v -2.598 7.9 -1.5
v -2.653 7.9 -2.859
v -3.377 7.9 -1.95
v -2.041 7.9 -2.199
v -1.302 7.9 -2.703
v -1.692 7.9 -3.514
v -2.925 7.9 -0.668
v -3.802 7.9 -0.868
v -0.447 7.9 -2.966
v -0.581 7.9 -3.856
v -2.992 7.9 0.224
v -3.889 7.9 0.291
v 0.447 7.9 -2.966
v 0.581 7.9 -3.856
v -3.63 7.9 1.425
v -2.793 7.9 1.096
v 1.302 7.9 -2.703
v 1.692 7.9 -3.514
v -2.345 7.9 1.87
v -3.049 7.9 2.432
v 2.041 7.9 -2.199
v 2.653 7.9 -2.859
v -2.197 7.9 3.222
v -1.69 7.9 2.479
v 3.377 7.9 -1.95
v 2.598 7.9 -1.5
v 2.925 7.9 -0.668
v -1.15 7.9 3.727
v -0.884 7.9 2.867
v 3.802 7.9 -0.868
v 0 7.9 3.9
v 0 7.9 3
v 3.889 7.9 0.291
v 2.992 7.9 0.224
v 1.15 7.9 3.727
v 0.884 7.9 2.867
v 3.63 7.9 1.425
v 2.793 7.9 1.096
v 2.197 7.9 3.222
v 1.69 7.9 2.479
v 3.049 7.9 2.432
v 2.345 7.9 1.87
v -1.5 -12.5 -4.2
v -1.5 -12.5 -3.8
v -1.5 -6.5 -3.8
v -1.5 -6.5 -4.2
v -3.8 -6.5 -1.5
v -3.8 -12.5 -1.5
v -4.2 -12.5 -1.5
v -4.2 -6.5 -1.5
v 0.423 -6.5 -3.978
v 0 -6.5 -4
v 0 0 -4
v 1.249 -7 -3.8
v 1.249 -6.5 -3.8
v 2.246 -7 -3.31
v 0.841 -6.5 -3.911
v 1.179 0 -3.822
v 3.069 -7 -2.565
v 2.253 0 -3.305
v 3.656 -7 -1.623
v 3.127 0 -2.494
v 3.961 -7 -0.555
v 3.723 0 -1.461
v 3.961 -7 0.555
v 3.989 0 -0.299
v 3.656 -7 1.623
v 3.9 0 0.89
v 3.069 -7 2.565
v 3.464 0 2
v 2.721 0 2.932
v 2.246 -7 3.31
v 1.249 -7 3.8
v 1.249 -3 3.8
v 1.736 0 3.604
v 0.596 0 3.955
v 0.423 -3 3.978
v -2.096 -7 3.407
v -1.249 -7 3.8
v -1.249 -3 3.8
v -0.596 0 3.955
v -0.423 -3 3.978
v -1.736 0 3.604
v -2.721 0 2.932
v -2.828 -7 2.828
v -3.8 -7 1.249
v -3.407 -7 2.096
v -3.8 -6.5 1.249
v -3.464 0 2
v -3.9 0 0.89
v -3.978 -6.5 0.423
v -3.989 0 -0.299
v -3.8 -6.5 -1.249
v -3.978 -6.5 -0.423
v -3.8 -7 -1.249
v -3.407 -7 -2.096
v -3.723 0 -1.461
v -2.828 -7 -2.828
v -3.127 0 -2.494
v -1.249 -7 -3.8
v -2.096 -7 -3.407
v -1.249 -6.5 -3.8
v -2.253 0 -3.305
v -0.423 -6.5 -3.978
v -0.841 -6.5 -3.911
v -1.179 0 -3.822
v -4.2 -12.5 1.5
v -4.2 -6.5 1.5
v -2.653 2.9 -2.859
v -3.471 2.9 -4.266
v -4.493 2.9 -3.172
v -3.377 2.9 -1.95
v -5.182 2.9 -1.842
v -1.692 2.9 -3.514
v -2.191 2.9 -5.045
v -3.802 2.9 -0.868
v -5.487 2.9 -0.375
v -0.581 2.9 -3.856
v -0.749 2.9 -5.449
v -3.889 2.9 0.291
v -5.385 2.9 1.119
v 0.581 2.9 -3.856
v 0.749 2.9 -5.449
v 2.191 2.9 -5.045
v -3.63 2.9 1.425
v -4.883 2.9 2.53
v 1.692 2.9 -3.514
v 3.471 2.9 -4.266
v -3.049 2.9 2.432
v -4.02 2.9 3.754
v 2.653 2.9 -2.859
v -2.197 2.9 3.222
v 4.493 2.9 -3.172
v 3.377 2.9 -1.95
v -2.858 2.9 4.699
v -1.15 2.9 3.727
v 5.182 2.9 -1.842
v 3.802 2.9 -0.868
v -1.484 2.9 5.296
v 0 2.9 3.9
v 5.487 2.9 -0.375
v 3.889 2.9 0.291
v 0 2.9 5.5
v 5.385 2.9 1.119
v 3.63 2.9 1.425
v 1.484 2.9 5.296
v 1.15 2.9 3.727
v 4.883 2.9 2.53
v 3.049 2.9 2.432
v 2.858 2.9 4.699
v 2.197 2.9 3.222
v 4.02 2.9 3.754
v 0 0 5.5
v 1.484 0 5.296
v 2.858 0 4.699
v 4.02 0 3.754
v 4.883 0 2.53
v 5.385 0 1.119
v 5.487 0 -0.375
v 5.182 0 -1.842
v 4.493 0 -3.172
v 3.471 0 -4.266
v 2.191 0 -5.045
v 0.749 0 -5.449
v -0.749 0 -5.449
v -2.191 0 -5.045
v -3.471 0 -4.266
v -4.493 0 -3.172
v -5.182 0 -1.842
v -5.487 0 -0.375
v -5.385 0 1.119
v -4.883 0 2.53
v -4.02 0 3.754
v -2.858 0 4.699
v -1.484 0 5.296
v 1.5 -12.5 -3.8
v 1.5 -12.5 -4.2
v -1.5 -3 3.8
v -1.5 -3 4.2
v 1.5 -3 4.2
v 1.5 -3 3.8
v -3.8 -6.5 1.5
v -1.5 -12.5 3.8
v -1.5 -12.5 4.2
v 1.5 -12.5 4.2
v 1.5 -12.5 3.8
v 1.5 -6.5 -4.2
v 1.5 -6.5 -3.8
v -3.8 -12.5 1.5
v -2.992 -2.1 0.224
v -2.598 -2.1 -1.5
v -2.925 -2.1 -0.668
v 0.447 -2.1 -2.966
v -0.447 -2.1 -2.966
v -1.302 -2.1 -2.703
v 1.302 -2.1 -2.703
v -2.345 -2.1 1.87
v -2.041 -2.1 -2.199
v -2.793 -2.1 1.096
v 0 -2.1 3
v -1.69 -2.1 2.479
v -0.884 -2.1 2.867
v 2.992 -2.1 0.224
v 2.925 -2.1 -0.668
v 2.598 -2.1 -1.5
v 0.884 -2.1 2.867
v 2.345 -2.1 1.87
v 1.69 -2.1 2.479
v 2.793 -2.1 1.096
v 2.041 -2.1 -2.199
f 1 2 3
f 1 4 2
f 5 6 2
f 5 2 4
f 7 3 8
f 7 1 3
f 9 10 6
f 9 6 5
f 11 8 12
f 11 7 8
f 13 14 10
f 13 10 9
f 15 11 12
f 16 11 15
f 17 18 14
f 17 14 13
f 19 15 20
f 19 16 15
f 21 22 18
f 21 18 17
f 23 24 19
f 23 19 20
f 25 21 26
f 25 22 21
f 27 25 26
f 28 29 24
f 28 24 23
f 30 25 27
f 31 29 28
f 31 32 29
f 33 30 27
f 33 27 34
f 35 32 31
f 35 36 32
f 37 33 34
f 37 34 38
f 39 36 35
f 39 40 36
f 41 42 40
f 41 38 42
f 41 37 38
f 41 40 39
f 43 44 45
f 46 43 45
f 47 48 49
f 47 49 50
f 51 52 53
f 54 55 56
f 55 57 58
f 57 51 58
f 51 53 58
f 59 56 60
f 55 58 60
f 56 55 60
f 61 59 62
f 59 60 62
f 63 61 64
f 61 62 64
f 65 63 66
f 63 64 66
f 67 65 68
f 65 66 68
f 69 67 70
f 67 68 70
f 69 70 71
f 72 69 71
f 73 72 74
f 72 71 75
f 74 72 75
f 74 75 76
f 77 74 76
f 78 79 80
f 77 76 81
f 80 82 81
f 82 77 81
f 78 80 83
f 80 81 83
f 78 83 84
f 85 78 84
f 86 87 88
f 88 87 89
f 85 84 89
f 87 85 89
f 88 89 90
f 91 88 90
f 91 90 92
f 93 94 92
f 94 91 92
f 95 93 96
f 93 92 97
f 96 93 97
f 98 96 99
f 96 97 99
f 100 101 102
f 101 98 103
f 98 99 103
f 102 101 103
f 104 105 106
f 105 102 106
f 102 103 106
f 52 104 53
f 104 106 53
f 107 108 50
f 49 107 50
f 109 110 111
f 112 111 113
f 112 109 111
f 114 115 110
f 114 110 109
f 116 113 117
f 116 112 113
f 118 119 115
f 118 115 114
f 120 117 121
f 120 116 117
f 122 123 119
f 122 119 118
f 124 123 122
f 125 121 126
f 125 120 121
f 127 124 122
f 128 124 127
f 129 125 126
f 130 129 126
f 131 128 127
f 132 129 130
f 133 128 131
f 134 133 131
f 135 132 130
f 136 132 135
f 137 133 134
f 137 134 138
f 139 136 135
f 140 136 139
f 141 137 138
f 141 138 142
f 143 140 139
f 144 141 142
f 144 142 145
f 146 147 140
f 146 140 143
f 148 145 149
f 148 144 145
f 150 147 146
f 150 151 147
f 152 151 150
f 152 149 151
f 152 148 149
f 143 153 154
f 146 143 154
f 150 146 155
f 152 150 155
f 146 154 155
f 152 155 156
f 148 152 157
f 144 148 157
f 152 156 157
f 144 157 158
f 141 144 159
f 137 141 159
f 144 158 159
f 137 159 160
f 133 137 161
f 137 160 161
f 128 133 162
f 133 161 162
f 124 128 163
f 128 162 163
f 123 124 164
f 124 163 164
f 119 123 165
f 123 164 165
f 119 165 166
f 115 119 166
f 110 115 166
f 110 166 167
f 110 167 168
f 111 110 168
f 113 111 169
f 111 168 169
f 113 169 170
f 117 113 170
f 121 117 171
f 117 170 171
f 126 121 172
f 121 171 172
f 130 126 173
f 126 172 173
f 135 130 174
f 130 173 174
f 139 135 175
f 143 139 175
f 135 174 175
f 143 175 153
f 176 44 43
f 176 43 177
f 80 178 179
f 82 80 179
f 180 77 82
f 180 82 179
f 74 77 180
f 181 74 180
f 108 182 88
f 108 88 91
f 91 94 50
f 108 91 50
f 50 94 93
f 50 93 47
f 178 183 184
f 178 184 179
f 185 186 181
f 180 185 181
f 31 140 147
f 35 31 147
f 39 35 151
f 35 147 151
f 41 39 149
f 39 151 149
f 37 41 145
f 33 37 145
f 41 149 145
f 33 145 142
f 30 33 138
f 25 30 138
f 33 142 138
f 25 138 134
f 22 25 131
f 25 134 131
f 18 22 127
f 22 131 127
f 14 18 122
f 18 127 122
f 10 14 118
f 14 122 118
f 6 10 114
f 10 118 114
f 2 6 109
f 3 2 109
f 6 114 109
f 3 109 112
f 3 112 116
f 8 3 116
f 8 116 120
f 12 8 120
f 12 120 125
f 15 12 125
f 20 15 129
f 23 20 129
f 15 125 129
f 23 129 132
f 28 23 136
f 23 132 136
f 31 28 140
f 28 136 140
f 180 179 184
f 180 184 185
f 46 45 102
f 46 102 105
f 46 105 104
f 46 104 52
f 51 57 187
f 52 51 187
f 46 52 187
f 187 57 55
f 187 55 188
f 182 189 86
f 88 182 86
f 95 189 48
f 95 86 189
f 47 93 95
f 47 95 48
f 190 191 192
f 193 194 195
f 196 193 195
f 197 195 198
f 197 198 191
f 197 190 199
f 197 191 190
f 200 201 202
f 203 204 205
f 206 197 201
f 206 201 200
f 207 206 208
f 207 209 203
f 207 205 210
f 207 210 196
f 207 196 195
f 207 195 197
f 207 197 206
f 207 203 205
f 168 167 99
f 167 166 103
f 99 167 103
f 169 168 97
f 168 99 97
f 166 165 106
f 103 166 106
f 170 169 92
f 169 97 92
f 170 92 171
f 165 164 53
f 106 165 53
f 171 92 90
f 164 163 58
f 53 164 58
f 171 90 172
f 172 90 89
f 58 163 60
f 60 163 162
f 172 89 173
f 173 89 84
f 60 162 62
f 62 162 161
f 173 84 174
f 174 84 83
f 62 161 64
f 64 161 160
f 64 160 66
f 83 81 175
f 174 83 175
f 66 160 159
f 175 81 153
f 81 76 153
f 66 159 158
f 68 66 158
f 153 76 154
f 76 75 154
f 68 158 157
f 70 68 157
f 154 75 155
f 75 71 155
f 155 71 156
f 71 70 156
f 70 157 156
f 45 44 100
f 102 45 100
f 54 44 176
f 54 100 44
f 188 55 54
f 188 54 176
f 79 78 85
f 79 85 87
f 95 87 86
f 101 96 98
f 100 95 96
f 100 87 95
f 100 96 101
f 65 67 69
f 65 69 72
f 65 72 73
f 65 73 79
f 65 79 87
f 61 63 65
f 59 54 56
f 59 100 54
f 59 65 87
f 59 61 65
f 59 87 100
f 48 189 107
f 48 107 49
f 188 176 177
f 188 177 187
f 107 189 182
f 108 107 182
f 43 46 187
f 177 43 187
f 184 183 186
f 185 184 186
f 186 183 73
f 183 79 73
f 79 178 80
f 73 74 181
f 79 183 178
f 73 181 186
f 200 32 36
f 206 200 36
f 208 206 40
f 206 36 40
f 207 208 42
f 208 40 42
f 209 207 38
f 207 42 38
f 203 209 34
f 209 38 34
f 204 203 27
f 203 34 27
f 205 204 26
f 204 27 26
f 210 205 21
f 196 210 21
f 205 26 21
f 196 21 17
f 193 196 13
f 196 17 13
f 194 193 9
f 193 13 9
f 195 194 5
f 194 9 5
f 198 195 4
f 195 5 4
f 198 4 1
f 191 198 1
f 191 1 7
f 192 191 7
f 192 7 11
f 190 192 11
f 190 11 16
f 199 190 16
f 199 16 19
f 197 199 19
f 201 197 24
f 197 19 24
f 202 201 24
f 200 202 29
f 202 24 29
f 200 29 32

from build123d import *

# Parameters (mm, degrees)
SCHIZZO1_R                   = 5.5
ESTRUSIONE_ESTRUSIONE1_DEPTH = 2.9
SCHIZZO2_R                   = 3.9
ESTRUSIONE_ESTRUSIONE2_DEPTH = 5
SCHIZZO3_R                   = 4
ESTRUSIONE_ESTRUSIONE3_DEPTH = 7
SCHIZZO4_R                   = 3
TAGLIO_ESTRUSIONE1_DEPTH     = 10
SCHIZZO5_W                   = 3
SCHIZZO5_H                   = 9.5
ESTRUSIONE_ESTRUSIONE4_DEPTH = 0.4
SCHIZZO7_W                   = 3
SCHIZZO7_H                   = 6
ESTRUSIONE_ESTRUSIONE5_DEPTH = 0.4
SCHIZZO8_W                   = 3
SCHIZZO8_H                   = 6
ESTRUSIONE_ESTRUSIONE6_DEPTH = 0.4


with BuildPart() as part:
    # Schizzo1 → Estrusione-Estrusione1 (new body)
    with BuildSketch(Plane(origin=(0, 0, 0), x_dir=(1, 0, 0), z_dir=(0, 1, 0))):
        with Locations(Location((0, 0, 0), (0, 0, 270))):
            Circle(SCHIZZO1_R)
    extrude(amount=ESTRUSIONE_ESTRUSIONE1_DEPTH)

    # Schizzo2 → Estrusione-Estrusione2 (add)
    with BuildSketch(Plane(origin=(0, 2.9, 0), x_dir=(1, 0, 0), z_dir=(0, 1, 0))):
        with Locations(Location((0, 0, 0), (0, 0, 270))):
            Circle(SCHIZZO2_R)
    extrude(amount=ESTRUSIONE_ESTRUSIONE2_DEPTH)

    # Schizzo3 → Estrusione-Estrusione3 (add)
    with BuildSketch(Plane.XZ):
        with Locations(Location((0, 0, 0), (0, 0, 270))):
            Circle(SCHIZZO3_R)
    extrude(amount=ESTRUSIONE_ESTRUSIONE3_DEPTH)

    # Schizzo4 → Taglio-Estrusione1 (cut)
    with BuildSketch(Plane(origin=(0, 7.9, 0), x_dir=(1, 0, 0), z_dir=(0, 1, 0))):
        with Locations(Location((0, 0, 0), (0, 0, 270))):
            Circle(SCHIZZO4_R)
    extrude(amount=-TAGLIO_ESTRUSIONE1_DEPTH, mode=Mode.SUBTRACT)

    # Schizzo5 → Estrusione-Estrusione4 (add)
    with BuildSketch(Plane.XY.offset(3.8)):
        with Locations((0, -7.75)):
            Rectangle(SCHIZZO5_W, SCHIZZO5_H)
    extrude(amount=ESTRUSIONE_ESTRUSIONE4_DEPTH)

    # Schizzo7 → Estrusione-Estrusione5 (add)
    with BuildSketch(Plane(origin=(-3.8, 0, 0), x_dir=(0, 0, -1), z_dir=(1, 0, 0))):
        with Locations((0, -9.5)):
            Rectangle(SCHIZZO7_W, SCHIZZO7_H)
    extrude(amount=-ESTRUSIONE_ESTRUSIONE5_DEPTH)

    # Schizzo8 → Estrusione-Estrusione6 (add)
    with BuildSketch(Plane.XY.offset(-3.8)):
        with Locations((0, -9.5)):
            Rectangle(SCHIZZO8_W, SCHIZZO8_H)
    extrude(amount=-ESTRUSIONE_ESTRUSIONE6_DEPTH)


solid = part.part
